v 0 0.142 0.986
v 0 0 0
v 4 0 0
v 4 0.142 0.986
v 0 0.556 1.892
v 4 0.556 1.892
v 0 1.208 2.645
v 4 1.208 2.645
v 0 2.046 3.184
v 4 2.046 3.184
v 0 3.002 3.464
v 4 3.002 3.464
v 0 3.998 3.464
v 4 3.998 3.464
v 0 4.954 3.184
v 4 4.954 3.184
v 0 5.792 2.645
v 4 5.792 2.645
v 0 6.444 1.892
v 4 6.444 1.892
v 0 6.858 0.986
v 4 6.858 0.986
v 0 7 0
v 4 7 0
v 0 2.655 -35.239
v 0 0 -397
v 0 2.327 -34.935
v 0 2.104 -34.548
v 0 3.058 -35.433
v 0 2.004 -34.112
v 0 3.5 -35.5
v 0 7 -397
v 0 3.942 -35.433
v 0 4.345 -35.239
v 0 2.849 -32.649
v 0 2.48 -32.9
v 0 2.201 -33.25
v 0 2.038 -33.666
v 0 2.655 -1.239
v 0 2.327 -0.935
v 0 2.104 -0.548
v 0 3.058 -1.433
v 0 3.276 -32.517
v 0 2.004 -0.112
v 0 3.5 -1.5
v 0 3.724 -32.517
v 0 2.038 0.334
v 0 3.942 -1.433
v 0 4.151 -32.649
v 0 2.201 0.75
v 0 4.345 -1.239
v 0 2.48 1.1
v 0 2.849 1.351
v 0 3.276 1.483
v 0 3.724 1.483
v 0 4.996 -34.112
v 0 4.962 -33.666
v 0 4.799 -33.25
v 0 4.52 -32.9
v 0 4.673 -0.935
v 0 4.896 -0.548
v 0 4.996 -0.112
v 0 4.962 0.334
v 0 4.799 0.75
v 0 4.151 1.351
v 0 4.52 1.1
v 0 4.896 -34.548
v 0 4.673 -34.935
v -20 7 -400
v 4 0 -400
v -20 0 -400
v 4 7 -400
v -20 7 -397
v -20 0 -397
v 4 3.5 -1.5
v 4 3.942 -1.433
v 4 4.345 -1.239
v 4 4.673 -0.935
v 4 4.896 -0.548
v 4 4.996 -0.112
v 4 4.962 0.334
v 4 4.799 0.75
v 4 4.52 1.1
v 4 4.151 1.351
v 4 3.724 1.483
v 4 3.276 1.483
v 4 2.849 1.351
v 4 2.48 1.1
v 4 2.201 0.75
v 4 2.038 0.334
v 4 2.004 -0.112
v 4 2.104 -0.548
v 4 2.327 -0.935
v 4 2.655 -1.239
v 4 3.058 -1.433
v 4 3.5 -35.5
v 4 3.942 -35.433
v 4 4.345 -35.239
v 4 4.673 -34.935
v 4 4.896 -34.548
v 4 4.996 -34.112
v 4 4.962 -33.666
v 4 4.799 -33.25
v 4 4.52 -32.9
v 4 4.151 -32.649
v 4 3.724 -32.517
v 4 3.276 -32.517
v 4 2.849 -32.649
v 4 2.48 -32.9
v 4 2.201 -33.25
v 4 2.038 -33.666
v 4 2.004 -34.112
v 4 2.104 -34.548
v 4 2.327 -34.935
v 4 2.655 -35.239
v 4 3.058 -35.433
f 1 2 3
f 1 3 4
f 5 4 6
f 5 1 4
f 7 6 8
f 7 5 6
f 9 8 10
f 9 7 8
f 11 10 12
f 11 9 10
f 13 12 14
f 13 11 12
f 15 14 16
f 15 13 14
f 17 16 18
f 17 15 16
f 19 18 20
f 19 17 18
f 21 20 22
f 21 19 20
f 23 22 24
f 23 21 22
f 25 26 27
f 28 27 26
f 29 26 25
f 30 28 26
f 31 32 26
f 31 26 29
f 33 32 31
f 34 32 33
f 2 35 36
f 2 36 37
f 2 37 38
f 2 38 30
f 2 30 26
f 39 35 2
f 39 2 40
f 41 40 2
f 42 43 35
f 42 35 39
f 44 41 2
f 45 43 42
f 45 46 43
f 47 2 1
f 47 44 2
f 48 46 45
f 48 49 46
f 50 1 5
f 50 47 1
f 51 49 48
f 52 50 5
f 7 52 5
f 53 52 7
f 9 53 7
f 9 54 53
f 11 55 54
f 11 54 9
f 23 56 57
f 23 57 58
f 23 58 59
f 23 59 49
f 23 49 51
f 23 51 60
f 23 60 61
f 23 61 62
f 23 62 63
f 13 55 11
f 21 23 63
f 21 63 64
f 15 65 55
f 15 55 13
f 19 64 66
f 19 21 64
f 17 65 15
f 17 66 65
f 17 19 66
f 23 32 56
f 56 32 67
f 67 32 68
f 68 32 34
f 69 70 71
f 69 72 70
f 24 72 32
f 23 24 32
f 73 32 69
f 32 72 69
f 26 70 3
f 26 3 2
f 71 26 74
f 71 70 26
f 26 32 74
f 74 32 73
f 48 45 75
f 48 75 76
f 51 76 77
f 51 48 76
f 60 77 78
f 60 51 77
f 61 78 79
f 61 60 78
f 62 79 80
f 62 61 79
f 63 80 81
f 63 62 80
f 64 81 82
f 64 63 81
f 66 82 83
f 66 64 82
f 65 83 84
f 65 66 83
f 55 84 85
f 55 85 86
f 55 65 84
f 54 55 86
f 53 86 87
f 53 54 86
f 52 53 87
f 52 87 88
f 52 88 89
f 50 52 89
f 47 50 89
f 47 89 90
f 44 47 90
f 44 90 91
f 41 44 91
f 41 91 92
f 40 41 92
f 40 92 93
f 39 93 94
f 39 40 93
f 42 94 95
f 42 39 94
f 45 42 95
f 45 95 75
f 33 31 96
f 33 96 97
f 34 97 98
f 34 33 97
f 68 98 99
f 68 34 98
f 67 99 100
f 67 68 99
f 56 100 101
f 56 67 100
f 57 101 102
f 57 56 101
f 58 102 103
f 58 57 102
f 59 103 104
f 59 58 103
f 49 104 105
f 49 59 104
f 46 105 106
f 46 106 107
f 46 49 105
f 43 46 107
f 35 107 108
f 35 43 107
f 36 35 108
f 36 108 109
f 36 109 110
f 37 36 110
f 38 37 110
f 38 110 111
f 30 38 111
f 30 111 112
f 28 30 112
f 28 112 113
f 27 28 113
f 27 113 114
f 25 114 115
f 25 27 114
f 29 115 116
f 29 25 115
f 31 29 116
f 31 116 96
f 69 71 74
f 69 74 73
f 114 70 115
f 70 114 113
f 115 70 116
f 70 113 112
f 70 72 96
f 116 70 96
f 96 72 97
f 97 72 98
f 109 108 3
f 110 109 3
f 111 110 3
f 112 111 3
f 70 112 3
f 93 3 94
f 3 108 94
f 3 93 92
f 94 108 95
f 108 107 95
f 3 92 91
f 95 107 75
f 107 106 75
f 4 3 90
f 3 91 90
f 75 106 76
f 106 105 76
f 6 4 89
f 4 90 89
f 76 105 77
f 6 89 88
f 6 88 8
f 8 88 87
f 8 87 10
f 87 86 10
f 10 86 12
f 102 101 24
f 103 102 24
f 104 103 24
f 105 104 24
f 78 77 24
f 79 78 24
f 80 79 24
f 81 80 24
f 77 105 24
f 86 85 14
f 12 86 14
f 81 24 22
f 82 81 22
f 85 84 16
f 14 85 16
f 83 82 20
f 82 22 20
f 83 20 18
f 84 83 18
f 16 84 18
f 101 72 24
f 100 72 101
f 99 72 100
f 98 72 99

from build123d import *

# Parameters (mm, degrees)
SKETCH_1_R      = 1.5
EXTRUDE_1_DEPTH = 4
SKETCH_2_W      = 20
SKETCH_2_H      = 7
EXTRUDE_2_DEPTH = 3


with BuildPart() as part:
    # 草图1 → 凸台-拉伸1 (new body)
    with BuildSketch(Plane(origin=(0, 0, 0), x_dir=(0, 0, -1), z_dir=(1, 0, 0))):
        with BuildLine():
            Line((400, 7), (400, 0))
            Line((400, 0), (0, 0))
            ThreePointArc((0, 0), (-3.5, 3.5), (0, 7))
            Line((0, 7), (400, 7))
        make_face()
        with Locations((0, 3.5)):
            Circle(SKETCH_1_R, mode=Mode.SUBTRACT)
        with Locations((34, 3.5)):
            Circle(SKETCH_1_R, mode=Mode.SUBTRACT)
    extrude(amount=EXTRUDE_1_DEPTH)

    # 草图2 → 凸台-拉伸2 (add)
    with BuildSketch(Plane(origin=(0, 0, -400), x_dir=(-1, 0, 0), z_dir=(0, 0, -1))):
        with Locations((10, 3.5)):
            Rectangle(SKETCH_2_W, SKETCH_2_H)
    extrude(amount=-EXTRUDE_2_DEPTH)


solid = part.part
